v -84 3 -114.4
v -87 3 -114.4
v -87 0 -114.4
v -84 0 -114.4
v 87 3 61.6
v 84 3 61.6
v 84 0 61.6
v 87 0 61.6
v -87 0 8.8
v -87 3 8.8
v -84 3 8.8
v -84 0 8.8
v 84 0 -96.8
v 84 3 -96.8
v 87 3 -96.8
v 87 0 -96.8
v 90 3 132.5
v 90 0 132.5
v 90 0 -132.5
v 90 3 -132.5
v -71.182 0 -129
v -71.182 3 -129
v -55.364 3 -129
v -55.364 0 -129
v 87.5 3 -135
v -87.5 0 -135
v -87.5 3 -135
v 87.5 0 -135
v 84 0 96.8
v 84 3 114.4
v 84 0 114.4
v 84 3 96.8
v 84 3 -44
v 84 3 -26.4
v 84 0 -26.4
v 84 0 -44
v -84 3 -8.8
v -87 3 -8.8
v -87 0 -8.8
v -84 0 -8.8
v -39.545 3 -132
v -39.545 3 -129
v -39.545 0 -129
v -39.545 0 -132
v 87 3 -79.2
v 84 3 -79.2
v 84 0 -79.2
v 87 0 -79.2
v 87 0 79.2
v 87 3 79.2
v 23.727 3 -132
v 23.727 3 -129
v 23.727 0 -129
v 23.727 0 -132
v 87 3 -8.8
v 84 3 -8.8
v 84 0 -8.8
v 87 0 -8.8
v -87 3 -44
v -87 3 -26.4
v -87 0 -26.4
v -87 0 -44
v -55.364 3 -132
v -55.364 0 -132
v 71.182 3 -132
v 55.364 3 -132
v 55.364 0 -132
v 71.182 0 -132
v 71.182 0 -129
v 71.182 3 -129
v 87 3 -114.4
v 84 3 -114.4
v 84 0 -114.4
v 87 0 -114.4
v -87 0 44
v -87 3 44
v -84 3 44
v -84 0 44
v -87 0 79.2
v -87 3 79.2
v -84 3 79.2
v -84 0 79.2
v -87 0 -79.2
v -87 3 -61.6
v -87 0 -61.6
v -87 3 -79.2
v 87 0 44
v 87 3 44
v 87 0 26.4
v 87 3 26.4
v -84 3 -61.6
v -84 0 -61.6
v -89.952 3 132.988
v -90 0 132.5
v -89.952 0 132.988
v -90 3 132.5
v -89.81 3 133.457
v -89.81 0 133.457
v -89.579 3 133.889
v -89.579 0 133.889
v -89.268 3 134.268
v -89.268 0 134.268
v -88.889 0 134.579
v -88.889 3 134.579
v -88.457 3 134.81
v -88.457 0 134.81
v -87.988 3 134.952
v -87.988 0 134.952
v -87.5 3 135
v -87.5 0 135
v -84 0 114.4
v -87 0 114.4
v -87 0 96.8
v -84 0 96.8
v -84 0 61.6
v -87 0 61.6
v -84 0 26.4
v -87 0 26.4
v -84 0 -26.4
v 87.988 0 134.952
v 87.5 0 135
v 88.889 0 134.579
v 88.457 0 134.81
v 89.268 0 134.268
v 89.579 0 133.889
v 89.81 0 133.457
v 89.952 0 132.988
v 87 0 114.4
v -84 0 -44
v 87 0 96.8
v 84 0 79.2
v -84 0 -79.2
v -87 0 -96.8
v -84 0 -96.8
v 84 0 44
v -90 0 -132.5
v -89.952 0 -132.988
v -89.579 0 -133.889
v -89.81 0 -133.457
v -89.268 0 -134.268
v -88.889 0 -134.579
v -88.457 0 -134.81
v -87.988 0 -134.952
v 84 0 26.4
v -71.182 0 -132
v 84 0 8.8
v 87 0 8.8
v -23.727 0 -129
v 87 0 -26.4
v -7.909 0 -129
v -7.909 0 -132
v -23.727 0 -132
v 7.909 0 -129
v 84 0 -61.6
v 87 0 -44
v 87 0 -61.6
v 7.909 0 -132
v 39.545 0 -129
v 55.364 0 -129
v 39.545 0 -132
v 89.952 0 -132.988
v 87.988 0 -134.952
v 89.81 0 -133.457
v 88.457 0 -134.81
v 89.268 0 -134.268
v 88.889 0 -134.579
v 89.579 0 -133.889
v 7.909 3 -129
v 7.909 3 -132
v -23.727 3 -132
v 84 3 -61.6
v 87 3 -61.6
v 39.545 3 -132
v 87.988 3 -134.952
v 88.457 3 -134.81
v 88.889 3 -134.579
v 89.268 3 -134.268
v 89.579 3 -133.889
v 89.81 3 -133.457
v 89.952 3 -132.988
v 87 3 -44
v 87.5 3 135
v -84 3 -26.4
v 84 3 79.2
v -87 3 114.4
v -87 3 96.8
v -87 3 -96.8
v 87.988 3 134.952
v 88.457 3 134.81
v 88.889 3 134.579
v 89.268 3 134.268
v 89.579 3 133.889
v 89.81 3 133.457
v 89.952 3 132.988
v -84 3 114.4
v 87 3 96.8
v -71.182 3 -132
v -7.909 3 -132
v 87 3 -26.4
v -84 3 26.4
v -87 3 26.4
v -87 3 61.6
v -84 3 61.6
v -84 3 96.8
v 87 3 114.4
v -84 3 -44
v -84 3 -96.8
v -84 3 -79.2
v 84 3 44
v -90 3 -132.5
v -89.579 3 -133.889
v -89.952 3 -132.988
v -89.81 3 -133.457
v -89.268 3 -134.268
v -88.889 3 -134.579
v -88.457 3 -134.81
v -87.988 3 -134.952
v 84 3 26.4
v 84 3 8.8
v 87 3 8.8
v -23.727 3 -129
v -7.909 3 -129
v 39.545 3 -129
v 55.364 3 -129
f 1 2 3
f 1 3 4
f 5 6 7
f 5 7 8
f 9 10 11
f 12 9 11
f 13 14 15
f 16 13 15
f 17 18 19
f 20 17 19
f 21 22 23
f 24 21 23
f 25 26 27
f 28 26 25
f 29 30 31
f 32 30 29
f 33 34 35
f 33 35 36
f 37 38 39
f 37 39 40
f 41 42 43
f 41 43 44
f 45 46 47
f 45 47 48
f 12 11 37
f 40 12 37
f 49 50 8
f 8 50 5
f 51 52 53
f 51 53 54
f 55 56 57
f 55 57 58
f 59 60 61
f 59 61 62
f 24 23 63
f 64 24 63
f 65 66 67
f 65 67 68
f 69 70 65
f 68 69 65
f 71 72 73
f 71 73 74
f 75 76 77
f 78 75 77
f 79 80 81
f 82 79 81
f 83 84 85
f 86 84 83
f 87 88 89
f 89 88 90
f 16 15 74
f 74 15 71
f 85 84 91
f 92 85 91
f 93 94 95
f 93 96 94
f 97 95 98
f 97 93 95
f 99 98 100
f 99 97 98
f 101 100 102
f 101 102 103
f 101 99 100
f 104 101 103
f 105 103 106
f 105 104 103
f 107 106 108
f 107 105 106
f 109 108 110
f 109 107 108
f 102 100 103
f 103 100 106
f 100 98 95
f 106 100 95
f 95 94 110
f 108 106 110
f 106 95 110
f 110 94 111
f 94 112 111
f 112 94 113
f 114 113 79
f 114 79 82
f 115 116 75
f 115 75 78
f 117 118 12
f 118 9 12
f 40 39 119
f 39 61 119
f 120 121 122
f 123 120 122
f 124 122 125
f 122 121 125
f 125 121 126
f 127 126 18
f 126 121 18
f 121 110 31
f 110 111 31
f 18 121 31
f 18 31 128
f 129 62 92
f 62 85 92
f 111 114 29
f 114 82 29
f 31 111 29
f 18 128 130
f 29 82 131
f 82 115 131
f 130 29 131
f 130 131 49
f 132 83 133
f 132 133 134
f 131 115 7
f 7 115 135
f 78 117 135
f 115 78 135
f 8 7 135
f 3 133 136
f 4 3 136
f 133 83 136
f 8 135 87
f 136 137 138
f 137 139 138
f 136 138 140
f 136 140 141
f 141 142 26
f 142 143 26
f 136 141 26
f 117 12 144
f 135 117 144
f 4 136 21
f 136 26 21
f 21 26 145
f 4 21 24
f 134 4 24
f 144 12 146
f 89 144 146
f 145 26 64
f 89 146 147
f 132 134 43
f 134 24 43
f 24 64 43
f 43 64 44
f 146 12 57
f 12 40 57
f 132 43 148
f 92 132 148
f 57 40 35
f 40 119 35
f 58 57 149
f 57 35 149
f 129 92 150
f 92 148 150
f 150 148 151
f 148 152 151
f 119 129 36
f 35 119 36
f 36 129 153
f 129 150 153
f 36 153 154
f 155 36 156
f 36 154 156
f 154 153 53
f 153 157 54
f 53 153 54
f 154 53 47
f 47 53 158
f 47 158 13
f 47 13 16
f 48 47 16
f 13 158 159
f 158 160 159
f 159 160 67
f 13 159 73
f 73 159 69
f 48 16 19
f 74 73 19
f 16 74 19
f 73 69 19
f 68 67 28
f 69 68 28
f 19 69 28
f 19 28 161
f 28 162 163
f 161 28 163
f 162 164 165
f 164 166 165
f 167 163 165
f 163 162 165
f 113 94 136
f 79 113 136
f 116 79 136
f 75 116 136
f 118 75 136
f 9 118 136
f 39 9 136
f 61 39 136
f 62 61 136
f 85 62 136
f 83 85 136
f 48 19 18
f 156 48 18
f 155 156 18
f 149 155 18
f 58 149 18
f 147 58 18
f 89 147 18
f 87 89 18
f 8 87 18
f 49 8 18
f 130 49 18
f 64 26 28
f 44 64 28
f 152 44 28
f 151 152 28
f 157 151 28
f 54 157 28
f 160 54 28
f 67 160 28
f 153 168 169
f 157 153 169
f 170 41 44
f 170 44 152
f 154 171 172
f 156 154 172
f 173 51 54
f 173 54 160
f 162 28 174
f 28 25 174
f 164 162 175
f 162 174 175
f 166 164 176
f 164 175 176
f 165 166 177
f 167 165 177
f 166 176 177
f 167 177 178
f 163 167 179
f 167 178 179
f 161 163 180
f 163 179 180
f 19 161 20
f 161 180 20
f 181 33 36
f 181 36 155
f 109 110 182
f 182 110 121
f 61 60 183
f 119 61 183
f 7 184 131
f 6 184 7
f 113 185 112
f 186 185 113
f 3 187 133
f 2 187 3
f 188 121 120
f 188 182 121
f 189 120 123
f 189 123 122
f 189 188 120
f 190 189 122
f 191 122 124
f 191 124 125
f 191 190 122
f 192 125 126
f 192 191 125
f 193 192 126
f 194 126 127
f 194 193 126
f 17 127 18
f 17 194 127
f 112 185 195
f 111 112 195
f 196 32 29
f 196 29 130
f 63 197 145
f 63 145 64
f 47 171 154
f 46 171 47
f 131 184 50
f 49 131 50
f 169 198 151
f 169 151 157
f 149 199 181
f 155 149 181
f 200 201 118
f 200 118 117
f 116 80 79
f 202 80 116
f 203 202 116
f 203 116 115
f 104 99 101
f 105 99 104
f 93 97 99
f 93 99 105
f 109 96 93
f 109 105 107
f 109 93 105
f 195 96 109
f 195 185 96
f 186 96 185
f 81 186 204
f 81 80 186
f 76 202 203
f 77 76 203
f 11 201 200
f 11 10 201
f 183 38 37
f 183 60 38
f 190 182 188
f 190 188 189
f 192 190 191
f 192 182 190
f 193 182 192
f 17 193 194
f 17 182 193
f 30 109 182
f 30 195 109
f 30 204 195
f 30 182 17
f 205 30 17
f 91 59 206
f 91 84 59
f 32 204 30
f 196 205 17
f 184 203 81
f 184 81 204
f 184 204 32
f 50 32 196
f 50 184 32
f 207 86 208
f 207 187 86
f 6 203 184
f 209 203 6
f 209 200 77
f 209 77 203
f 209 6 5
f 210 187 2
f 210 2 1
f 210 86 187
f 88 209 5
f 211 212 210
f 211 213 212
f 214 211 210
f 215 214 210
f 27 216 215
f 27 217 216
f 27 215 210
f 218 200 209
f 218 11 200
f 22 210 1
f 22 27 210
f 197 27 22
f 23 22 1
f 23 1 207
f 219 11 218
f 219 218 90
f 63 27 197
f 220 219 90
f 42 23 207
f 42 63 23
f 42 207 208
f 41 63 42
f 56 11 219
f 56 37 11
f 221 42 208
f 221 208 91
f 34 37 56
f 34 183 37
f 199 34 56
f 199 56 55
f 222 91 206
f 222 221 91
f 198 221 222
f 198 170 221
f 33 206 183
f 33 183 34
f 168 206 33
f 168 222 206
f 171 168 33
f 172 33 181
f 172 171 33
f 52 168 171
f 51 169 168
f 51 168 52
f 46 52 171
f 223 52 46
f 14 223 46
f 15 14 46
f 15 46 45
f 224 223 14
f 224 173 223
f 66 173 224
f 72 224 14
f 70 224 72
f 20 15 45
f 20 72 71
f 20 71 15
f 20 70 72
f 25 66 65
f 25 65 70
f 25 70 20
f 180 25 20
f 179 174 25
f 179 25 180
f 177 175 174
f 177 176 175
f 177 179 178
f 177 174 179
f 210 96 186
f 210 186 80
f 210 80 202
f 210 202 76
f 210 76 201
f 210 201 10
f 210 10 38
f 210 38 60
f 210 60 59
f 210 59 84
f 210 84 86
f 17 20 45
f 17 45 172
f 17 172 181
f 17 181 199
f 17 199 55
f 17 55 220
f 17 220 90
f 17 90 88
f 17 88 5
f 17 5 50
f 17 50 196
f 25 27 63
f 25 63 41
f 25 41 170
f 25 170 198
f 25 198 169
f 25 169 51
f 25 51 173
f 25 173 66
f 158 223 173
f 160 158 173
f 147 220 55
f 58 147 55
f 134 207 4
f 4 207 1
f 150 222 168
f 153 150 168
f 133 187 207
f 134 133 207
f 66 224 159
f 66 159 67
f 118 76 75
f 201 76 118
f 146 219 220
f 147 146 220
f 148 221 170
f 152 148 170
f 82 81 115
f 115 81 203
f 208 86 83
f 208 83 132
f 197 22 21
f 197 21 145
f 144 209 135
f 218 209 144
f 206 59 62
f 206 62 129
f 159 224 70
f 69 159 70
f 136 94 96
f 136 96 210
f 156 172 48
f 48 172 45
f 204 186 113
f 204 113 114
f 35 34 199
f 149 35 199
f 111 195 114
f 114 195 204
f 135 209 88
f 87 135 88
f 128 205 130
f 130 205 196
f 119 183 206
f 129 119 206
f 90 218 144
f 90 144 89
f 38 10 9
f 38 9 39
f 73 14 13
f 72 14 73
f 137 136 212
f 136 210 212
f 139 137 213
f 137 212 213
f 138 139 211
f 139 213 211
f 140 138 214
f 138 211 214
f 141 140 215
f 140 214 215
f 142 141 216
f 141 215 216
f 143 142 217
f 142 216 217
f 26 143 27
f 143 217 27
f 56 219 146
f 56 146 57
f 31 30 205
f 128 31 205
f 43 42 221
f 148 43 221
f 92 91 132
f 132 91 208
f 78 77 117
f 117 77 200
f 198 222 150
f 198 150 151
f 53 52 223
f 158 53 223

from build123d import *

# Parameters (mm, degrees)
SKETCH1_W               = 180
SKETCH1_H               = 270
BOSS_EXTRUDE1_DEPTH     = 3
SKETCH2_W               = 15.818181818
SKETCH2_H               = 3
SKETCH2_W_2             = 3
SKETCH2_H_2             = 17.6
CUT_EXTRUDE1_DEPTH      = 1
CUT_EXTRUDE1_DEPTH_BACK = 4
FILLET1_R               = 2.5


with BuildPart() as part:
    # Sketch1 → Boss-Extrude1 (new body)
    with BuildSketch(Plane(origin=(0, 0, 0), x_dir=(1, 0, 0), z_dir=(0, 1, 0))):
        Rectangle(SKETCH1_W, SKETCH1_H)
    extrude(amount=BOSS_EXTRUDE1_DEPTH)

    # Sketch2 → Cut-Extrude1 (cut, two sides)
    with BuildSketch(Plane(origin=(0, 3, 0), x_dir=(1, 0, 0), z_dir=(0, 1, 0))) as cut_extrude1_sk:
        with Locations((0, 130.5)):
            Rectangle(SKETCH2_W, SKETCH2_H)
        with Locations((31.636363636, 130.5)):
            Rectangle(SKETCH2_W, SKETCH2_H)
        with Locations((63.272727273, 130.5)):
            Rectangle(SKETCH2_W, SKETCH2_H)
        with Locations((85.5, -70.4)):
            Rectangle(SKETCH2_W_2, SKETCH2_H_2)
        with Locations((-31.636363636, 130.5)):
            Rectangle(SKETCH2_W, SKETCH2_H)
        with Locations((-63.272727273, 130.5)):
            Rectangle(SKETCH2_W, SKETCH2_H)
        with Locations((85.5, -105.6)):
            Rectangle(SKETCH2_W_2, SKETCH2_H_2)
        with Locations((-85.5, 105.6)):
            Rectangle(SKETCH2_W_2, SKETCH2_H_2)
        with Locations((-85.5, 70.4)):
            Rectangle(SKETCH2_W_2, SKETCH2_H_2)
        with Locations((-85.5, 35.2)):
            Rectangle(SKETCH2_W_2, SKETCH2_H_2)
        with Locations((-85.5, 0)):
            Rectangle(SKETCH2_W_2, SKETCH2_H_2)
        with Locations((85.5, 105.6)):
            Rectangle(SKETCH2_W_2, SKETCH2_H_2)
        with Locations((85.5, 70.4)):
            Rectangle(SKETCH2_W_2, SKETCH2_H_2)
        with Locations((85.5, 35.2)):
            Rectangle(SKETCH2_W_2, SKETCH2_H_2)
        with Locations((85.5, 0)):
            Rectangle(SKETCH2_W_2, SKETCH2_H_2)
        with Locations((85.5, -35.2)):
            Rectangle(SKETCH2_W_2, SKETCH2_H_2)
        with Locations((-85.5, -35.2)):
            Rectangle(SKETCH2_W_2, SKETCH2_H_2)
        with Locations((-85.5, -70.4)):
            Rectangle(SKETCH2_W_2, SKETCH2_H_2)
        with Locations((-85.5, -105.6)):
            Rectangle(SKETCH2_W_2, SKETCH2_H_2)
    extrude(amount=CUT_EXTRUDE1_DEPTH, mode=Mode.SUBTRACT)
    extrude(cut_extrude1_sk.sketch, amount=-CUT_EXTRUDE1_DEPTH_BACK, mode=Mode.SUBTRACT)

    # Fillet1
    fillet1_edges = [part.edges().sort_by_distance(p)[0] for p in [
        (90, 1.5, -135),
        (90, 1.5, 135),
        (-90, 1.5, 135),
        (-90, 1.5, -135),
    ]]
    fillet(fillet1_edges, radius=FILLET1_R)


solid = part.part
